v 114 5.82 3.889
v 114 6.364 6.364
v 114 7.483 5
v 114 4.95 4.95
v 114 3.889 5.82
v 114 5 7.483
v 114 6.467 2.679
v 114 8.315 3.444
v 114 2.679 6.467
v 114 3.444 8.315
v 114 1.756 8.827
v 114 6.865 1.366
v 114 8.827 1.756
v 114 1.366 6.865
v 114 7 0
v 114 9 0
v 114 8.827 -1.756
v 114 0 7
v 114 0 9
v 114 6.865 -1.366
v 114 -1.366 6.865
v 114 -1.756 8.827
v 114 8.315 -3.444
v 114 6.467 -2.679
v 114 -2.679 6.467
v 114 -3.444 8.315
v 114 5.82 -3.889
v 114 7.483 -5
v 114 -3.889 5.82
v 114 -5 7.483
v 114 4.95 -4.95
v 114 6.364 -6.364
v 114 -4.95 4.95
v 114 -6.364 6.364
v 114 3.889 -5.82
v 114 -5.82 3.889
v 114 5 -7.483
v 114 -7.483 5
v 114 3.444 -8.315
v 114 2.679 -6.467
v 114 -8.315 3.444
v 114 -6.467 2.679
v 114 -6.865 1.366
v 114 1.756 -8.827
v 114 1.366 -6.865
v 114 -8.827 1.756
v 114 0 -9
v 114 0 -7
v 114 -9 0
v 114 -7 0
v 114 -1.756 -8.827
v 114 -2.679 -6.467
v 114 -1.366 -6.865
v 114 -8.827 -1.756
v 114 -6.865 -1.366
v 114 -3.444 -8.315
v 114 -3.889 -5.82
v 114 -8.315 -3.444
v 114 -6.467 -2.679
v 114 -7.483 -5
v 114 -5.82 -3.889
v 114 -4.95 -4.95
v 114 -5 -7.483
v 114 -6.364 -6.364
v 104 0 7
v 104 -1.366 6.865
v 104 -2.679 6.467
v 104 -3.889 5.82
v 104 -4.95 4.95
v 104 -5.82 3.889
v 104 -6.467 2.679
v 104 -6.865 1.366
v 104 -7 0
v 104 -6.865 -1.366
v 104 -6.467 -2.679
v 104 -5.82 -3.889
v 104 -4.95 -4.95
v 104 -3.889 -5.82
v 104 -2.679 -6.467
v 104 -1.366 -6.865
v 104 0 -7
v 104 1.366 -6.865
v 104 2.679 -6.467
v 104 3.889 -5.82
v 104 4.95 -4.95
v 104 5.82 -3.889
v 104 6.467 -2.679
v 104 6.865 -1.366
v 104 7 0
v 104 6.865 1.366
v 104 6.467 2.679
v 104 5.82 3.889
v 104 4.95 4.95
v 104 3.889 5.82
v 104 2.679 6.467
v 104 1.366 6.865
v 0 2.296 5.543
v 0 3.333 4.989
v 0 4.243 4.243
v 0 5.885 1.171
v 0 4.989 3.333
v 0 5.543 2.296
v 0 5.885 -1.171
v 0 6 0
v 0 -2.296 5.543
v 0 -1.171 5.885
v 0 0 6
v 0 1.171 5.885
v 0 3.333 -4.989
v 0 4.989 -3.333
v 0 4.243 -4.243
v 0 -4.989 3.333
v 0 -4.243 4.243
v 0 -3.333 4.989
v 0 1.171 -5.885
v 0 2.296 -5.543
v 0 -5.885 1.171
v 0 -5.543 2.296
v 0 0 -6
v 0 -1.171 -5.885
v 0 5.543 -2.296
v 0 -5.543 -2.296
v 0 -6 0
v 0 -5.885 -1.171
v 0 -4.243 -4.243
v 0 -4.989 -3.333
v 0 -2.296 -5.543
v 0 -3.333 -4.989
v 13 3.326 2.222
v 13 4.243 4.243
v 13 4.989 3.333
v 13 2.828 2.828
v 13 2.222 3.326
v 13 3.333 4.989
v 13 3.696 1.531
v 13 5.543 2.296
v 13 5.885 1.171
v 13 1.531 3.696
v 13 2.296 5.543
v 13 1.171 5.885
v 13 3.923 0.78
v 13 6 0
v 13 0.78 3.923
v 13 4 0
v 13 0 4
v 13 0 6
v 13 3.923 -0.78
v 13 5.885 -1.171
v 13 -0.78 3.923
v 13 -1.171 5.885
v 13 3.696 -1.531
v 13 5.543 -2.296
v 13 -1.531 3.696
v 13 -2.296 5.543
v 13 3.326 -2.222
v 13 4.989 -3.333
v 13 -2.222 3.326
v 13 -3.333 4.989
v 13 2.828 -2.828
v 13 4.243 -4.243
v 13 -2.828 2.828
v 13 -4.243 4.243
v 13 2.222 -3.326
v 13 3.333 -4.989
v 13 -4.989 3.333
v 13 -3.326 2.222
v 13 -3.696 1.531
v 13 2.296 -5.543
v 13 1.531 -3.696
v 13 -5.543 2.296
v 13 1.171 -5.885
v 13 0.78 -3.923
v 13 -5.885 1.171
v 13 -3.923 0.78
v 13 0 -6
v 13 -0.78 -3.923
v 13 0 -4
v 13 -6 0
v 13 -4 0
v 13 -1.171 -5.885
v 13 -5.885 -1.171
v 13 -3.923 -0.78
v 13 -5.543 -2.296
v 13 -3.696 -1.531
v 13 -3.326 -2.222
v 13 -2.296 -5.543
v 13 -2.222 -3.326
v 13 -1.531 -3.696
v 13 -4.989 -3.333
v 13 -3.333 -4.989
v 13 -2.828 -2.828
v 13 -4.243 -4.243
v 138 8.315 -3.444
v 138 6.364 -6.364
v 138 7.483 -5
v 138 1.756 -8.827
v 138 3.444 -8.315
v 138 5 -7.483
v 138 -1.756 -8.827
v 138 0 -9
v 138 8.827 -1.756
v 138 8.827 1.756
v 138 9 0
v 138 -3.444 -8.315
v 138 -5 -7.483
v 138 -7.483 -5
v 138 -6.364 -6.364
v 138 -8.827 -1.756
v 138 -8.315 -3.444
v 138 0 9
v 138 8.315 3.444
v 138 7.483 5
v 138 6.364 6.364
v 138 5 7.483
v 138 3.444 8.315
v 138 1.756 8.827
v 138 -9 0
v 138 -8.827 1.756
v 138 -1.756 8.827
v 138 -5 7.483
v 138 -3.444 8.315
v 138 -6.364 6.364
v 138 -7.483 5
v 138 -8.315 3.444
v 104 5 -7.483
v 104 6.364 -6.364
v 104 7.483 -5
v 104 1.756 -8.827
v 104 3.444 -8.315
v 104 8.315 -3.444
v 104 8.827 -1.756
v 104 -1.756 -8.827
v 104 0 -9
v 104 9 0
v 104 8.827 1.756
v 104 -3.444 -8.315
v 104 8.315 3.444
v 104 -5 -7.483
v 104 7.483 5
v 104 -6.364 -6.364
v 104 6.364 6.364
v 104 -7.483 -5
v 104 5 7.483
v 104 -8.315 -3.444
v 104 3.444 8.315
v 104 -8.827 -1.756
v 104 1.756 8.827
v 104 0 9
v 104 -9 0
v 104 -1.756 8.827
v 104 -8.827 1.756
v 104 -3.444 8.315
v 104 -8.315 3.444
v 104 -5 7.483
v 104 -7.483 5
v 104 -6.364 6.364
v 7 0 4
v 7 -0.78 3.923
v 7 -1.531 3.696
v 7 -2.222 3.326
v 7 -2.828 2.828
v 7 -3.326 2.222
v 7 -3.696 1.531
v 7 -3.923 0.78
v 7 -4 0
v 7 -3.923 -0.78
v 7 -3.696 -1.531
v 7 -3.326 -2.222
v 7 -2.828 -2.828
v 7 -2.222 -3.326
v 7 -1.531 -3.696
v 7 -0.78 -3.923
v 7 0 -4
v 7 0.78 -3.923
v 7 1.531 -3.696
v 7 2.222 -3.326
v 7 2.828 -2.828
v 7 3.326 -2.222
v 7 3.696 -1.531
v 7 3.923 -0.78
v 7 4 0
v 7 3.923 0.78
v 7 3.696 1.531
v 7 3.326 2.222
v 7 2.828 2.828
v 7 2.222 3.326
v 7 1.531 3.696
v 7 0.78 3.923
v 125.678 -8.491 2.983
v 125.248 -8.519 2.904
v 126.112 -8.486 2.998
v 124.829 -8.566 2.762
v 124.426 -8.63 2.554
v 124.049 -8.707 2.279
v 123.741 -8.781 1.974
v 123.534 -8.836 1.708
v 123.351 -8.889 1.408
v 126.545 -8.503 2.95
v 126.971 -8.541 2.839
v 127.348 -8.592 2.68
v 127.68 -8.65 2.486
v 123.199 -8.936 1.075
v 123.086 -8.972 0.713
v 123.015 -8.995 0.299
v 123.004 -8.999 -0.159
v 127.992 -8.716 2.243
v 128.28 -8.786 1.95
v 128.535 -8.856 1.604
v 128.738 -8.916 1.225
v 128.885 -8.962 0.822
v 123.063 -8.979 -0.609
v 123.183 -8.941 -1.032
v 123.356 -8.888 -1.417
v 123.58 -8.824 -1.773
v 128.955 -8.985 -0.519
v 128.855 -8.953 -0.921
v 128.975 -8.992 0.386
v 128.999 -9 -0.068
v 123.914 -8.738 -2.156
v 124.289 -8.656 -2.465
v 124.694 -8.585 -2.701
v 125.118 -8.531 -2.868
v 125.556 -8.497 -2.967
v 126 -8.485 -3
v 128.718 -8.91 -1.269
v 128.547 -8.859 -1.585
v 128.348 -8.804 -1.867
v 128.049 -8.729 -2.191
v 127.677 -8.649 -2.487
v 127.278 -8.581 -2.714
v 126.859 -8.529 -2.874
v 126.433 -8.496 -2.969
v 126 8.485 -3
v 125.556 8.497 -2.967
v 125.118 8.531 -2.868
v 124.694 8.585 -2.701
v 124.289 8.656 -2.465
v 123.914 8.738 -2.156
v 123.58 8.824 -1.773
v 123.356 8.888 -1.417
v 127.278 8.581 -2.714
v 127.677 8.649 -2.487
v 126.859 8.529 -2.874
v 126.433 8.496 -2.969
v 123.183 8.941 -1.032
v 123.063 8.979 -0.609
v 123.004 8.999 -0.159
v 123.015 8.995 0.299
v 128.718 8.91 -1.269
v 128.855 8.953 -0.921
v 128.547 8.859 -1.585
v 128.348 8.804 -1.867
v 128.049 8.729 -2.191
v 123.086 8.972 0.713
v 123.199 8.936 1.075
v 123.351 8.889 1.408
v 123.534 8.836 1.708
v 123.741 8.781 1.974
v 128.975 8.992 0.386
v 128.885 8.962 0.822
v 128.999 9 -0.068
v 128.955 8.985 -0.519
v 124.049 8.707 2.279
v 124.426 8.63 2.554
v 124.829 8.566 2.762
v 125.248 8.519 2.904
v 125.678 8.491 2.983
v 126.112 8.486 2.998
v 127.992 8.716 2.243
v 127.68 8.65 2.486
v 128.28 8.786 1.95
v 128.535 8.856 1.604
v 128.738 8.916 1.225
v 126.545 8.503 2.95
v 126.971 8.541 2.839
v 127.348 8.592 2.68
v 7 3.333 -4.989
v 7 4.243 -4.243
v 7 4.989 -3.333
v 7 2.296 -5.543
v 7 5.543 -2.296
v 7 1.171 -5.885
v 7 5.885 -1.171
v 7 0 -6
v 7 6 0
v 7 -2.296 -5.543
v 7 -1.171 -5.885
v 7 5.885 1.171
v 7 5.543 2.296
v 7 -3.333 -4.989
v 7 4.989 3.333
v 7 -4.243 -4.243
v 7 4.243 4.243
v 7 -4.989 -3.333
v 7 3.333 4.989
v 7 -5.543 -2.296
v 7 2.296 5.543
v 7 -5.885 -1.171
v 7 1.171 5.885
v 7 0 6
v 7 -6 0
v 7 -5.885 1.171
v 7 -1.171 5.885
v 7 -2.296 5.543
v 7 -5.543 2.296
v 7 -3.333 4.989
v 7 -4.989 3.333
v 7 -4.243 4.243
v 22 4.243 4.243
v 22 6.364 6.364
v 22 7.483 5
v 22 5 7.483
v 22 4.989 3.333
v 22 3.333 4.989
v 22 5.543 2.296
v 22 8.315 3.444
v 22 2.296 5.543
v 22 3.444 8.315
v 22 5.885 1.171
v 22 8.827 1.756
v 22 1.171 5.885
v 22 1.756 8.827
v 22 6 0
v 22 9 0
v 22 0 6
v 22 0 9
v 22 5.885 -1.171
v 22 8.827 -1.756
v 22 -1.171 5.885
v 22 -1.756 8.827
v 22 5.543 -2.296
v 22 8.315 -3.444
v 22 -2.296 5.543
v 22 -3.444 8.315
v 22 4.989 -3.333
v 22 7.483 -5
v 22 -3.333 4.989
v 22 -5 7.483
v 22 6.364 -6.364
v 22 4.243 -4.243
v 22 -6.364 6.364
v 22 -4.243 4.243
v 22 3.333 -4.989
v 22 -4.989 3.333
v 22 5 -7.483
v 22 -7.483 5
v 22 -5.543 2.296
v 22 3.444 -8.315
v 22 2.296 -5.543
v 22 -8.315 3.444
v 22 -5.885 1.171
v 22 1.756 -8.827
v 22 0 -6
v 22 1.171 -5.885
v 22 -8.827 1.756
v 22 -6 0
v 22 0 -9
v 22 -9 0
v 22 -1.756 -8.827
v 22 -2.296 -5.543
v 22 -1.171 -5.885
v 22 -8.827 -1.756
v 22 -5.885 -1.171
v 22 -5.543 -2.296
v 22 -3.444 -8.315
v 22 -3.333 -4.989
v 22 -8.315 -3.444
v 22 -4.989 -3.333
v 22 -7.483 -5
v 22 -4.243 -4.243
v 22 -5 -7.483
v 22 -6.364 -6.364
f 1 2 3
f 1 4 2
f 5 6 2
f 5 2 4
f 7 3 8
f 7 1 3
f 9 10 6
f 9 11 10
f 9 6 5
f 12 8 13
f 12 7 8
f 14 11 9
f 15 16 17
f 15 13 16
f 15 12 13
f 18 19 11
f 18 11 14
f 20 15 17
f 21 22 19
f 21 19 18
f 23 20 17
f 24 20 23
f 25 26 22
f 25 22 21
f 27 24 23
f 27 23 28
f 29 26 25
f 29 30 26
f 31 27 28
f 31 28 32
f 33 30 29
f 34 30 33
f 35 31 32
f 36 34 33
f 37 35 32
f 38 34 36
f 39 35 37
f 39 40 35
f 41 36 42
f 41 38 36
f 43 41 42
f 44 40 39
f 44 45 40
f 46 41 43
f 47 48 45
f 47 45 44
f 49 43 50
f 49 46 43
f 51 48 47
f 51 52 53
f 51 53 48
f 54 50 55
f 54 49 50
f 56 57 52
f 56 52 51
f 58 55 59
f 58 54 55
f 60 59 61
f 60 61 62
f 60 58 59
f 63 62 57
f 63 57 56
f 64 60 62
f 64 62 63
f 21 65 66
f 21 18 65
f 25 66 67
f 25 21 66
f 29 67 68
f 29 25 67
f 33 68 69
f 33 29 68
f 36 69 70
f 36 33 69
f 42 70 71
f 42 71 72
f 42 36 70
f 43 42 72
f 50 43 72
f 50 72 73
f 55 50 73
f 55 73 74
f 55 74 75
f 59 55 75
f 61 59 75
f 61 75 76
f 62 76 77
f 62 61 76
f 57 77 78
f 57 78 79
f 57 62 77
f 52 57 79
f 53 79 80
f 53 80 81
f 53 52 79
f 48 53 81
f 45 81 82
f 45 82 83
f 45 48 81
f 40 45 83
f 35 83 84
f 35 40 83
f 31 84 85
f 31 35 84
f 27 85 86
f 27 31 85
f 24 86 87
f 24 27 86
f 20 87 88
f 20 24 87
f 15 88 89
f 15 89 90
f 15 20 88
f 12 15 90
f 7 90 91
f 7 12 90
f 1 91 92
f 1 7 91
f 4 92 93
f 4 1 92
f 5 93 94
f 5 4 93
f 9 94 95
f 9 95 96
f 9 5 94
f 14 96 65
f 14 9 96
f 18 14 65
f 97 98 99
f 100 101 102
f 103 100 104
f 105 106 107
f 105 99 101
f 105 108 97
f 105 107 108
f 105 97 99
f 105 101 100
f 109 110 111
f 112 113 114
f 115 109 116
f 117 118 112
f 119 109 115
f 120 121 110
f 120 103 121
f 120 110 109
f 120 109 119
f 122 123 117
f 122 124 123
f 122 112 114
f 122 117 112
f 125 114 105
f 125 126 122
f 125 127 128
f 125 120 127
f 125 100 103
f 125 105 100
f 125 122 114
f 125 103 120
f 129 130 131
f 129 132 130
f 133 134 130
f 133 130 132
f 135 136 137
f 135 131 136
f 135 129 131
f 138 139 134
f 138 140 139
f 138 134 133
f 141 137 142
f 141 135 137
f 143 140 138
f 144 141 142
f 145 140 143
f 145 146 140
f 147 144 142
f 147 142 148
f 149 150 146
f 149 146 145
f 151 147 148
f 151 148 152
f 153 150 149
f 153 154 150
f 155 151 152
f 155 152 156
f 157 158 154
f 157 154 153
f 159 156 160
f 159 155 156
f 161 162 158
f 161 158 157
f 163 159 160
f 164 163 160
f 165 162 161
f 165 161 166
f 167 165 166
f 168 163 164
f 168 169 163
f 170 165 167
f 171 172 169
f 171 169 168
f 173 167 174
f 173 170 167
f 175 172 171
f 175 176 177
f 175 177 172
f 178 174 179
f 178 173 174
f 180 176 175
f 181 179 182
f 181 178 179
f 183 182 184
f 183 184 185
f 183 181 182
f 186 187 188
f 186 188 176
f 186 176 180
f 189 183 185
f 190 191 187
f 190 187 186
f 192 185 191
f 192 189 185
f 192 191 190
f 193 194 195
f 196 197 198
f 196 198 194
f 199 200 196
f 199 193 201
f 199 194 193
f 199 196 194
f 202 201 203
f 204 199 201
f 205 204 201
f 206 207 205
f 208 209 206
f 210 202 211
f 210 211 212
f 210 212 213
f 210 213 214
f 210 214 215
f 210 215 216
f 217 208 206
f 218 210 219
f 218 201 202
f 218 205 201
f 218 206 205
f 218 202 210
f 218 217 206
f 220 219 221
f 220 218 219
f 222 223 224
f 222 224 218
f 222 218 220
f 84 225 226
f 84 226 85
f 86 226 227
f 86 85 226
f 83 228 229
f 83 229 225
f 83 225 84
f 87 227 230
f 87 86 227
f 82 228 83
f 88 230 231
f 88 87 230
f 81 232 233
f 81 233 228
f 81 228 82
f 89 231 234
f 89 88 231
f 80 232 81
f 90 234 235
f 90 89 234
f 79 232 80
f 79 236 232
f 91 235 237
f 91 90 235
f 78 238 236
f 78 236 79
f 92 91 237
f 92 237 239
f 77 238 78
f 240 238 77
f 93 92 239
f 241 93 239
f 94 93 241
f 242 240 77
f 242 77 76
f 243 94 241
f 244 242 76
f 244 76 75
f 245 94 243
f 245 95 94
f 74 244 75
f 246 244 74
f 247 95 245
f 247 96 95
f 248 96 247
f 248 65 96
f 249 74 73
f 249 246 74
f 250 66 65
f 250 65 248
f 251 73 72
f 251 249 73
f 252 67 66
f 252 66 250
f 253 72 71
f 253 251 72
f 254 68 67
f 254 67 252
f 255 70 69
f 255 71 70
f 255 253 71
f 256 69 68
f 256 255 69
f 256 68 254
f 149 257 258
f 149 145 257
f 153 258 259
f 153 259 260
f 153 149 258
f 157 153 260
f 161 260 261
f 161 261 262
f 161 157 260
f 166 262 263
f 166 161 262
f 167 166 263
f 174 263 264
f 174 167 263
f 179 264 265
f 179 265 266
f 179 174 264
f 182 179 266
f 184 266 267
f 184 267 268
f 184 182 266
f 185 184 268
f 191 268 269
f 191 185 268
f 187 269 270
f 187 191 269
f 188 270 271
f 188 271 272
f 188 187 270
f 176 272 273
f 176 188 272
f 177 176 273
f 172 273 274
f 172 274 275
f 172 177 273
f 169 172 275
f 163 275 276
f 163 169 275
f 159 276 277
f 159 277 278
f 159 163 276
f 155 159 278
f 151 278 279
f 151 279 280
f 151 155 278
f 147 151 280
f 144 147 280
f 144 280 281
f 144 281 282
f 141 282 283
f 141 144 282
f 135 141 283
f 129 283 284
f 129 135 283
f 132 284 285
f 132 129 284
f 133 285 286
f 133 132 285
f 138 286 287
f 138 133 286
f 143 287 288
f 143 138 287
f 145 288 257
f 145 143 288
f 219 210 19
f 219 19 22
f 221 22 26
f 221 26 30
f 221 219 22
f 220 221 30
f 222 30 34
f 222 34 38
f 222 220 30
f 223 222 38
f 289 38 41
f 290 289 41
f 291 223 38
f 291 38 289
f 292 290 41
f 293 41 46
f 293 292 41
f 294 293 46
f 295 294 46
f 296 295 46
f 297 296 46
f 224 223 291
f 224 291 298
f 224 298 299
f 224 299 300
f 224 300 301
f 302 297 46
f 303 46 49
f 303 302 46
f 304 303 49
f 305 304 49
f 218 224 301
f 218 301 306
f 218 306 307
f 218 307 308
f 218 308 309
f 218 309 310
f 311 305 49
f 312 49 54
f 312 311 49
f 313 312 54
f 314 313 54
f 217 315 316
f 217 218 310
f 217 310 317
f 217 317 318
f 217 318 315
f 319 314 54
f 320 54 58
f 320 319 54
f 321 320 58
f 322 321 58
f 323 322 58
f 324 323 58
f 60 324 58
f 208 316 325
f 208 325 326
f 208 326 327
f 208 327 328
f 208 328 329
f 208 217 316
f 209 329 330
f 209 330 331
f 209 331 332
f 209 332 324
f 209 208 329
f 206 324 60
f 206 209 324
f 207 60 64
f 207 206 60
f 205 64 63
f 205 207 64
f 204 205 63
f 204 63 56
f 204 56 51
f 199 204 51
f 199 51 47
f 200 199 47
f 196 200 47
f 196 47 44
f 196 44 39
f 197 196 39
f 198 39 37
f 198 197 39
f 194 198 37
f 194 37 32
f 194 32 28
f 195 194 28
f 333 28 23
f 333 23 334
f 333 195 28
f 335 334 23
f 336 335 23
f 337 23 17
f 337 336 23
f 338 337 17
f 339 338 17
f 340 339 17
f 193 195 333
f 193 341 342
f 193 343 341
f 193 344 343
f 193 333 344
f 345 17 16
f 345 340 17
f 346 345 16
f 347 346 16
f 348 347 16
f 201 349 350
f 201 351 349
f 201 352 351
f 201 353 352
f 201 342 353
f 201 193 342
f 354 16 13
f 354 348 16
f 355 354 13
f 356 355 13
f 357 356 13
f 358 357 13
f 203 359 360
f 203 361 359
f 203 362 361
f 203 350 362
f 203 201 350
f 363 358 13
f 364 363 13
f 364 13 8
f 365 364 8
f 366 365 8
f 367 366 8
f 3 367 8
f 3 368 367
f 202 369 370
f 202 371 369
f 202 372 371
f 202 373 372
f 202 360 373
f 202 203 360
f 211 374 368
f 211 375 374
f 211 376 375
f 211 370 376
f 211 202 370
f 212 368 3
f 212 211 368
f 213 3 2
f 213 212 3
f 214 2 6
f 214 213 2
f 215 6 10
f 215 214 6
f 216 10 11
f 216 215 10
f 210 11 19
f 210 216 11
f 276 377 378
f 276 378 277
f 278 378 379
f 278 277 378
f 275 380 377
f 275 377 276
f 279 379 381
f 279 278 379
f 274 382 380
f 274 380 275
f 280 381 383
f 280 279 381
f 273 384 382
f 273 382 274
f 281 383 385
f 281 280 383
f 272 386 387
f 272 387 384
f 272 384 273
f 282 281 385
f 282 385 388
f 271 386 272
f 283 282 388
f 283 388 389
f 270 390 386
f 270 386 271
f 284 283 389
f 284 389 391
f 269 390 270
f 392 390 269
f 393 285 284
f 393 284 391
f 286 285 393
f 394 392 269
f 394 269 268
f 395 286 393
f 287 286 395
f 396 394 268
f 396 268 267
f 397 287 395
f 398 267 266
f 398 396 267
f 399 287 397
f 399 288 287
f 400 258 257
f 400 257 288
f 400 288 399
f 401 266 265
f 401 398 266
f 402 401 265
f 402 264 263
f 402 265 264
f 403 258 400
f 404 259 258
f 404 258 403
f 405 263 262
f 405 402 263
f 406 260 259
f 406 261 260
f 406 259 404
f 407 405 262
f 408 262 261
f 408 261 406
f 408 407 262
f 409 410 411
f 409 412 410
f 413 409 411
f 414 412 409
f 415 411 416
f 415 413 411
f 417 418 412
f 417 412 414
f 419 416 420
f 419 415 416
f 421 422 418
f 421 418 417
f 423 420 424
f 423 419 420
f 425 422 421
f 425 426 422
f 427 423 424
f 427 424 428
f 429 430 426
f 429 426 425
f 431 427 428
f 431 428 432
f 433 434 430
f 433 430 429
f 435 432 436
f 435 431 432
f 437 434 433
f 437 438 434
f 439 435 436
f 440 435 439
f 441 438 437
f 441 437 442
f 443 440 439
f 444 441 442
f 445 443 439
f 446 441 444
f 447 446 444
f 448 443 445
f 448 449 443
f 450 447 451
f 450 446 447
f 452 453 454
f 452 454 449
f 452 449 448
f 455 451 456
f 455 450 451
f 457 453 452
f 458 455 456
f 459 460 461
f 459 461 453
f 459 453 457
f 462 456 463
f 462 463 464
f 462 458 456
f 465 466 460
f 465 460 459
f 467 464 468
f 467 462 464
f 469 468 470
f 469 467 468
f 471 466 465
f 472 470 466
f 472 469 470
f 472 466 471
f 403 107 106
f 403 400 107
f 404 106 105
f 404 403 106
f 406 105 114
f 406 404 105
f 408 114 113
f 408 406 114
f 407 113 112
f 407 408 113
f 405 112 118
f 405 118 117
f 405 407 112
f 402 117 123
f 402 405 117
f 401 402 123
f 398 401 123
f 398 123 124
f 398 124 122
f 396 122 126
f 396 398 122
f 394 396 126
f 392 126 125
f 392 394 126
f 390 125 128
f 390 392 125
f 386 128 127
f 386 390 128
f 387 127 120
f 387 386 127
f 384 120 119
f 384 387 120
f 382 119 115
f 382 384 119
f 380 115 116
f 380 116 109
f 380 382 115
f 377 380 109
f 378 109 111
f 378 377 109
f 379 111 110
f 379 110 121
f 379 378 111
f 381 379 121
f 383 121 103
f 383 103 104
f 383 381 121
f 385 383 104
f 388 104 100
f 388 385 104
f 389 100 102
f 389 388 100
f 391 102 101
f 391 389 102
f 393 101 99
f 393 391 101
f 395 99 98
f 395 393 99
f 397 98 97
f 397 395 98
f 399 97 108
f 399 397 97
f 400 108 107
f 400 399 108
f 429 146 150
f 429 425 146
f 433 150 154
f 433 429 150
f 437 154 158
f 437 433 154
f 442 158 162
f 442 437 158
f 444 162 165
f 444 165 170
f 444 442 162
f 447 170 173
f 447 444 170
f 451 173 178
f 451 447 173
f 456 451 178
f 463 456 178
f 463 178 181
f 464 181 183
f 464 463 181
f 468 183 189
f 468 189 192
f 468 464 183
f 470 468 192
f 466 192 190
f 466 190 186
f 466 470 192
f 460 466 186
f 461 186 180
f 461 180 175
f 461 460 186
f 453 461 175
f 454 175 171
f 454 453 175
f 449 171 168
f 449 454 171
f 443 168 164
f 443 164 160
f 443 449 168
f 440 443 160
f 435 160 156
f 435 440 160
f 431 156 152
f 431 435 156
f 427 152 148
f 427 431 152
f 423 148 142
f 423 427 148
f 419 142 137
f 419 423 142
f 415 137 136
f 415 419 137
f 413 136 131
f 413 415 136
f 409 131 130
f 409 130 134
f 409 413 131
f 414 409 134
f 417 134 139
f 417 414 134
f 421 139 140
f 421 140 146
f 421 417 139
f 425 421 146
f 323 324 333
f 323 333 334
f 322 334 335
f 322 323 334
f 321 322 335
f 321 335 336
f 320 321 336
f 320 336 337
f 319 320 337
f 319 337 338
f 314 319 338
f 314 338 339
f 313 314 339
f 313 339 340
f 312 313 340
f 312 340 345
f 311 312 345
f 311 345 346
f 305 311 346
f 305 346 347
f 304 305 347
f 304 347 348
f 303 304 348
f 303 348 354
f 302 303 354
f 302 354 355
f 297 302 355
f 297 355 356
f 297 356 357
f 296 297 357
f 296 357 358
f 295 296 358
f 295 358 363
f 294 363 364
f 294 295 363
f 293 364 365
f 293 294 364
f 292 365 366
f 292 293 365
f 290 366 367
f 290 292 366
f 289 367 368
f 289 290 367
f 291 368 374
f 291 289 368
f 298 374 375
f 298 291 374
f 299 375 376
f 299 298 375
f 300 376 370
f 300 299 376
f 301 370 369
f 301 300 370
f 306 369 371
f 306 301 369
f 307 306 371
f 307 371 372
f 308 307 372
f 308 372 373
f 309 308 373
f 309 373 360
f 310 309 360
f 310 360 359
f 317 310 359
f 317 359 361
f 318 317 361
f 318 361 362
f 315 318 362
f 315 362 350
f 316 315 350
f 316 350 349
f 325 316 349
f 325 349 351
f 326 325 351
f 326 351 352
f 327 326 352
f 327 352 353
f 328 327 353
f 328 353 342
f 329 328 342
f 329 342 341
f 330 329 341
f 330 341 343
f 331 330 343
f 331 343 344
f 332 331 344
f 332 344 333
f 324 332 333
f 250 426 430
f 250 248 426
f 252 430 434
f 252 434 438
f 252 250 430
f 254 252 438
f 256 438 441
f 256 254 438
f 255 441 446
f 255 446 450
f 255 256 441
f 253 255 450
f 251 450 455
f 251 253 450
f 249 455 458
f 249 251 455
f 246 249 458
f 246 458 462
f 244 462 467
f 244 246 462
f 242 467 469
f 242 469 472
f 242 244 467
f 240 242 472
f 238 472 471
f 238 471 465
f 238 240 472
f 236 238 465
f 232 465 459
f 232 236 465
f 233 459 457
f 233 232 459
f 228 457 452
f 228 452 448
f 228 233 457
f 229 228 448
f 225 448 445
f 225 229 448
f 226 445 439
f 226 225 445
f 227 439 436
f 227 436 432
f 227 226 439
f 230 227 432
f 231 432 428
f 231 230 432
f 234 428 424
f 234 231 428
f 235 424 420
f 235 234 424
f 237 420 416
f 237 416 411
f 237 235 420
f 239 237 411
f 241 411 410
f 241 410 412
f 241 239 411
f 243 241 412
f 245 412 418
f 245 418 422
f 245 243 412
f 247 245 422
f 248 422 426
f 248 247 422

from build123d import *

# Parameters (mm, degrees)
CUT_EXTRUDE3_DEPTH      = 139.585713549
CUT_EXTRUDE3_DEPTH_BACK = 139.585713549
SKETCH3_R               = 3


with BuildPart() as part:
    # Sketch1 → Revolve1 (revolve)
    with BuildSketch(Plane(origin=(0, 0, 0), x_dir=(1, 0, 0), z_dir=(0, 1, 0)), mode=Mode.PRIVATE) as revolve1_sk:
        Polygon((0, 0), (0, 6), (7, 6), (7, 4), (13, 4), (13, 6), (22, 6), (22, 9), (104, 9), (104, 7), (114, 7), (114, 9), (138, 9), (138, 0), align=None)
    revolve(revolve1_sk.sketch.rotate(Axis((0, 0, 0), (1, 0, 0)), 180), axis=Axis((0, 0, 0), (1, 0, 0)))

    # Sketch3 → Cut-Extrude3 (cut, two sides: drawn at the far end of the back side and taken through both)
    with BuildSketch(Plane(origin=(0, 0, 0), x_dir=(1, 0, 0), z_dir=(0, 1, 0)).offset(-CUT_EXTRUDE3_DEPTH_BACK)):
        with Locations(Location((126, 0, 0), (0, 0, 90))):
            Circle(SKETCH3_R)
    extrude(amount=CUT_EXTRUDE3_DEPTH + CUT_EXTRUDE3_DEPTH_BACK, mode=Mode.SUBTRACT)


solid = part.part
